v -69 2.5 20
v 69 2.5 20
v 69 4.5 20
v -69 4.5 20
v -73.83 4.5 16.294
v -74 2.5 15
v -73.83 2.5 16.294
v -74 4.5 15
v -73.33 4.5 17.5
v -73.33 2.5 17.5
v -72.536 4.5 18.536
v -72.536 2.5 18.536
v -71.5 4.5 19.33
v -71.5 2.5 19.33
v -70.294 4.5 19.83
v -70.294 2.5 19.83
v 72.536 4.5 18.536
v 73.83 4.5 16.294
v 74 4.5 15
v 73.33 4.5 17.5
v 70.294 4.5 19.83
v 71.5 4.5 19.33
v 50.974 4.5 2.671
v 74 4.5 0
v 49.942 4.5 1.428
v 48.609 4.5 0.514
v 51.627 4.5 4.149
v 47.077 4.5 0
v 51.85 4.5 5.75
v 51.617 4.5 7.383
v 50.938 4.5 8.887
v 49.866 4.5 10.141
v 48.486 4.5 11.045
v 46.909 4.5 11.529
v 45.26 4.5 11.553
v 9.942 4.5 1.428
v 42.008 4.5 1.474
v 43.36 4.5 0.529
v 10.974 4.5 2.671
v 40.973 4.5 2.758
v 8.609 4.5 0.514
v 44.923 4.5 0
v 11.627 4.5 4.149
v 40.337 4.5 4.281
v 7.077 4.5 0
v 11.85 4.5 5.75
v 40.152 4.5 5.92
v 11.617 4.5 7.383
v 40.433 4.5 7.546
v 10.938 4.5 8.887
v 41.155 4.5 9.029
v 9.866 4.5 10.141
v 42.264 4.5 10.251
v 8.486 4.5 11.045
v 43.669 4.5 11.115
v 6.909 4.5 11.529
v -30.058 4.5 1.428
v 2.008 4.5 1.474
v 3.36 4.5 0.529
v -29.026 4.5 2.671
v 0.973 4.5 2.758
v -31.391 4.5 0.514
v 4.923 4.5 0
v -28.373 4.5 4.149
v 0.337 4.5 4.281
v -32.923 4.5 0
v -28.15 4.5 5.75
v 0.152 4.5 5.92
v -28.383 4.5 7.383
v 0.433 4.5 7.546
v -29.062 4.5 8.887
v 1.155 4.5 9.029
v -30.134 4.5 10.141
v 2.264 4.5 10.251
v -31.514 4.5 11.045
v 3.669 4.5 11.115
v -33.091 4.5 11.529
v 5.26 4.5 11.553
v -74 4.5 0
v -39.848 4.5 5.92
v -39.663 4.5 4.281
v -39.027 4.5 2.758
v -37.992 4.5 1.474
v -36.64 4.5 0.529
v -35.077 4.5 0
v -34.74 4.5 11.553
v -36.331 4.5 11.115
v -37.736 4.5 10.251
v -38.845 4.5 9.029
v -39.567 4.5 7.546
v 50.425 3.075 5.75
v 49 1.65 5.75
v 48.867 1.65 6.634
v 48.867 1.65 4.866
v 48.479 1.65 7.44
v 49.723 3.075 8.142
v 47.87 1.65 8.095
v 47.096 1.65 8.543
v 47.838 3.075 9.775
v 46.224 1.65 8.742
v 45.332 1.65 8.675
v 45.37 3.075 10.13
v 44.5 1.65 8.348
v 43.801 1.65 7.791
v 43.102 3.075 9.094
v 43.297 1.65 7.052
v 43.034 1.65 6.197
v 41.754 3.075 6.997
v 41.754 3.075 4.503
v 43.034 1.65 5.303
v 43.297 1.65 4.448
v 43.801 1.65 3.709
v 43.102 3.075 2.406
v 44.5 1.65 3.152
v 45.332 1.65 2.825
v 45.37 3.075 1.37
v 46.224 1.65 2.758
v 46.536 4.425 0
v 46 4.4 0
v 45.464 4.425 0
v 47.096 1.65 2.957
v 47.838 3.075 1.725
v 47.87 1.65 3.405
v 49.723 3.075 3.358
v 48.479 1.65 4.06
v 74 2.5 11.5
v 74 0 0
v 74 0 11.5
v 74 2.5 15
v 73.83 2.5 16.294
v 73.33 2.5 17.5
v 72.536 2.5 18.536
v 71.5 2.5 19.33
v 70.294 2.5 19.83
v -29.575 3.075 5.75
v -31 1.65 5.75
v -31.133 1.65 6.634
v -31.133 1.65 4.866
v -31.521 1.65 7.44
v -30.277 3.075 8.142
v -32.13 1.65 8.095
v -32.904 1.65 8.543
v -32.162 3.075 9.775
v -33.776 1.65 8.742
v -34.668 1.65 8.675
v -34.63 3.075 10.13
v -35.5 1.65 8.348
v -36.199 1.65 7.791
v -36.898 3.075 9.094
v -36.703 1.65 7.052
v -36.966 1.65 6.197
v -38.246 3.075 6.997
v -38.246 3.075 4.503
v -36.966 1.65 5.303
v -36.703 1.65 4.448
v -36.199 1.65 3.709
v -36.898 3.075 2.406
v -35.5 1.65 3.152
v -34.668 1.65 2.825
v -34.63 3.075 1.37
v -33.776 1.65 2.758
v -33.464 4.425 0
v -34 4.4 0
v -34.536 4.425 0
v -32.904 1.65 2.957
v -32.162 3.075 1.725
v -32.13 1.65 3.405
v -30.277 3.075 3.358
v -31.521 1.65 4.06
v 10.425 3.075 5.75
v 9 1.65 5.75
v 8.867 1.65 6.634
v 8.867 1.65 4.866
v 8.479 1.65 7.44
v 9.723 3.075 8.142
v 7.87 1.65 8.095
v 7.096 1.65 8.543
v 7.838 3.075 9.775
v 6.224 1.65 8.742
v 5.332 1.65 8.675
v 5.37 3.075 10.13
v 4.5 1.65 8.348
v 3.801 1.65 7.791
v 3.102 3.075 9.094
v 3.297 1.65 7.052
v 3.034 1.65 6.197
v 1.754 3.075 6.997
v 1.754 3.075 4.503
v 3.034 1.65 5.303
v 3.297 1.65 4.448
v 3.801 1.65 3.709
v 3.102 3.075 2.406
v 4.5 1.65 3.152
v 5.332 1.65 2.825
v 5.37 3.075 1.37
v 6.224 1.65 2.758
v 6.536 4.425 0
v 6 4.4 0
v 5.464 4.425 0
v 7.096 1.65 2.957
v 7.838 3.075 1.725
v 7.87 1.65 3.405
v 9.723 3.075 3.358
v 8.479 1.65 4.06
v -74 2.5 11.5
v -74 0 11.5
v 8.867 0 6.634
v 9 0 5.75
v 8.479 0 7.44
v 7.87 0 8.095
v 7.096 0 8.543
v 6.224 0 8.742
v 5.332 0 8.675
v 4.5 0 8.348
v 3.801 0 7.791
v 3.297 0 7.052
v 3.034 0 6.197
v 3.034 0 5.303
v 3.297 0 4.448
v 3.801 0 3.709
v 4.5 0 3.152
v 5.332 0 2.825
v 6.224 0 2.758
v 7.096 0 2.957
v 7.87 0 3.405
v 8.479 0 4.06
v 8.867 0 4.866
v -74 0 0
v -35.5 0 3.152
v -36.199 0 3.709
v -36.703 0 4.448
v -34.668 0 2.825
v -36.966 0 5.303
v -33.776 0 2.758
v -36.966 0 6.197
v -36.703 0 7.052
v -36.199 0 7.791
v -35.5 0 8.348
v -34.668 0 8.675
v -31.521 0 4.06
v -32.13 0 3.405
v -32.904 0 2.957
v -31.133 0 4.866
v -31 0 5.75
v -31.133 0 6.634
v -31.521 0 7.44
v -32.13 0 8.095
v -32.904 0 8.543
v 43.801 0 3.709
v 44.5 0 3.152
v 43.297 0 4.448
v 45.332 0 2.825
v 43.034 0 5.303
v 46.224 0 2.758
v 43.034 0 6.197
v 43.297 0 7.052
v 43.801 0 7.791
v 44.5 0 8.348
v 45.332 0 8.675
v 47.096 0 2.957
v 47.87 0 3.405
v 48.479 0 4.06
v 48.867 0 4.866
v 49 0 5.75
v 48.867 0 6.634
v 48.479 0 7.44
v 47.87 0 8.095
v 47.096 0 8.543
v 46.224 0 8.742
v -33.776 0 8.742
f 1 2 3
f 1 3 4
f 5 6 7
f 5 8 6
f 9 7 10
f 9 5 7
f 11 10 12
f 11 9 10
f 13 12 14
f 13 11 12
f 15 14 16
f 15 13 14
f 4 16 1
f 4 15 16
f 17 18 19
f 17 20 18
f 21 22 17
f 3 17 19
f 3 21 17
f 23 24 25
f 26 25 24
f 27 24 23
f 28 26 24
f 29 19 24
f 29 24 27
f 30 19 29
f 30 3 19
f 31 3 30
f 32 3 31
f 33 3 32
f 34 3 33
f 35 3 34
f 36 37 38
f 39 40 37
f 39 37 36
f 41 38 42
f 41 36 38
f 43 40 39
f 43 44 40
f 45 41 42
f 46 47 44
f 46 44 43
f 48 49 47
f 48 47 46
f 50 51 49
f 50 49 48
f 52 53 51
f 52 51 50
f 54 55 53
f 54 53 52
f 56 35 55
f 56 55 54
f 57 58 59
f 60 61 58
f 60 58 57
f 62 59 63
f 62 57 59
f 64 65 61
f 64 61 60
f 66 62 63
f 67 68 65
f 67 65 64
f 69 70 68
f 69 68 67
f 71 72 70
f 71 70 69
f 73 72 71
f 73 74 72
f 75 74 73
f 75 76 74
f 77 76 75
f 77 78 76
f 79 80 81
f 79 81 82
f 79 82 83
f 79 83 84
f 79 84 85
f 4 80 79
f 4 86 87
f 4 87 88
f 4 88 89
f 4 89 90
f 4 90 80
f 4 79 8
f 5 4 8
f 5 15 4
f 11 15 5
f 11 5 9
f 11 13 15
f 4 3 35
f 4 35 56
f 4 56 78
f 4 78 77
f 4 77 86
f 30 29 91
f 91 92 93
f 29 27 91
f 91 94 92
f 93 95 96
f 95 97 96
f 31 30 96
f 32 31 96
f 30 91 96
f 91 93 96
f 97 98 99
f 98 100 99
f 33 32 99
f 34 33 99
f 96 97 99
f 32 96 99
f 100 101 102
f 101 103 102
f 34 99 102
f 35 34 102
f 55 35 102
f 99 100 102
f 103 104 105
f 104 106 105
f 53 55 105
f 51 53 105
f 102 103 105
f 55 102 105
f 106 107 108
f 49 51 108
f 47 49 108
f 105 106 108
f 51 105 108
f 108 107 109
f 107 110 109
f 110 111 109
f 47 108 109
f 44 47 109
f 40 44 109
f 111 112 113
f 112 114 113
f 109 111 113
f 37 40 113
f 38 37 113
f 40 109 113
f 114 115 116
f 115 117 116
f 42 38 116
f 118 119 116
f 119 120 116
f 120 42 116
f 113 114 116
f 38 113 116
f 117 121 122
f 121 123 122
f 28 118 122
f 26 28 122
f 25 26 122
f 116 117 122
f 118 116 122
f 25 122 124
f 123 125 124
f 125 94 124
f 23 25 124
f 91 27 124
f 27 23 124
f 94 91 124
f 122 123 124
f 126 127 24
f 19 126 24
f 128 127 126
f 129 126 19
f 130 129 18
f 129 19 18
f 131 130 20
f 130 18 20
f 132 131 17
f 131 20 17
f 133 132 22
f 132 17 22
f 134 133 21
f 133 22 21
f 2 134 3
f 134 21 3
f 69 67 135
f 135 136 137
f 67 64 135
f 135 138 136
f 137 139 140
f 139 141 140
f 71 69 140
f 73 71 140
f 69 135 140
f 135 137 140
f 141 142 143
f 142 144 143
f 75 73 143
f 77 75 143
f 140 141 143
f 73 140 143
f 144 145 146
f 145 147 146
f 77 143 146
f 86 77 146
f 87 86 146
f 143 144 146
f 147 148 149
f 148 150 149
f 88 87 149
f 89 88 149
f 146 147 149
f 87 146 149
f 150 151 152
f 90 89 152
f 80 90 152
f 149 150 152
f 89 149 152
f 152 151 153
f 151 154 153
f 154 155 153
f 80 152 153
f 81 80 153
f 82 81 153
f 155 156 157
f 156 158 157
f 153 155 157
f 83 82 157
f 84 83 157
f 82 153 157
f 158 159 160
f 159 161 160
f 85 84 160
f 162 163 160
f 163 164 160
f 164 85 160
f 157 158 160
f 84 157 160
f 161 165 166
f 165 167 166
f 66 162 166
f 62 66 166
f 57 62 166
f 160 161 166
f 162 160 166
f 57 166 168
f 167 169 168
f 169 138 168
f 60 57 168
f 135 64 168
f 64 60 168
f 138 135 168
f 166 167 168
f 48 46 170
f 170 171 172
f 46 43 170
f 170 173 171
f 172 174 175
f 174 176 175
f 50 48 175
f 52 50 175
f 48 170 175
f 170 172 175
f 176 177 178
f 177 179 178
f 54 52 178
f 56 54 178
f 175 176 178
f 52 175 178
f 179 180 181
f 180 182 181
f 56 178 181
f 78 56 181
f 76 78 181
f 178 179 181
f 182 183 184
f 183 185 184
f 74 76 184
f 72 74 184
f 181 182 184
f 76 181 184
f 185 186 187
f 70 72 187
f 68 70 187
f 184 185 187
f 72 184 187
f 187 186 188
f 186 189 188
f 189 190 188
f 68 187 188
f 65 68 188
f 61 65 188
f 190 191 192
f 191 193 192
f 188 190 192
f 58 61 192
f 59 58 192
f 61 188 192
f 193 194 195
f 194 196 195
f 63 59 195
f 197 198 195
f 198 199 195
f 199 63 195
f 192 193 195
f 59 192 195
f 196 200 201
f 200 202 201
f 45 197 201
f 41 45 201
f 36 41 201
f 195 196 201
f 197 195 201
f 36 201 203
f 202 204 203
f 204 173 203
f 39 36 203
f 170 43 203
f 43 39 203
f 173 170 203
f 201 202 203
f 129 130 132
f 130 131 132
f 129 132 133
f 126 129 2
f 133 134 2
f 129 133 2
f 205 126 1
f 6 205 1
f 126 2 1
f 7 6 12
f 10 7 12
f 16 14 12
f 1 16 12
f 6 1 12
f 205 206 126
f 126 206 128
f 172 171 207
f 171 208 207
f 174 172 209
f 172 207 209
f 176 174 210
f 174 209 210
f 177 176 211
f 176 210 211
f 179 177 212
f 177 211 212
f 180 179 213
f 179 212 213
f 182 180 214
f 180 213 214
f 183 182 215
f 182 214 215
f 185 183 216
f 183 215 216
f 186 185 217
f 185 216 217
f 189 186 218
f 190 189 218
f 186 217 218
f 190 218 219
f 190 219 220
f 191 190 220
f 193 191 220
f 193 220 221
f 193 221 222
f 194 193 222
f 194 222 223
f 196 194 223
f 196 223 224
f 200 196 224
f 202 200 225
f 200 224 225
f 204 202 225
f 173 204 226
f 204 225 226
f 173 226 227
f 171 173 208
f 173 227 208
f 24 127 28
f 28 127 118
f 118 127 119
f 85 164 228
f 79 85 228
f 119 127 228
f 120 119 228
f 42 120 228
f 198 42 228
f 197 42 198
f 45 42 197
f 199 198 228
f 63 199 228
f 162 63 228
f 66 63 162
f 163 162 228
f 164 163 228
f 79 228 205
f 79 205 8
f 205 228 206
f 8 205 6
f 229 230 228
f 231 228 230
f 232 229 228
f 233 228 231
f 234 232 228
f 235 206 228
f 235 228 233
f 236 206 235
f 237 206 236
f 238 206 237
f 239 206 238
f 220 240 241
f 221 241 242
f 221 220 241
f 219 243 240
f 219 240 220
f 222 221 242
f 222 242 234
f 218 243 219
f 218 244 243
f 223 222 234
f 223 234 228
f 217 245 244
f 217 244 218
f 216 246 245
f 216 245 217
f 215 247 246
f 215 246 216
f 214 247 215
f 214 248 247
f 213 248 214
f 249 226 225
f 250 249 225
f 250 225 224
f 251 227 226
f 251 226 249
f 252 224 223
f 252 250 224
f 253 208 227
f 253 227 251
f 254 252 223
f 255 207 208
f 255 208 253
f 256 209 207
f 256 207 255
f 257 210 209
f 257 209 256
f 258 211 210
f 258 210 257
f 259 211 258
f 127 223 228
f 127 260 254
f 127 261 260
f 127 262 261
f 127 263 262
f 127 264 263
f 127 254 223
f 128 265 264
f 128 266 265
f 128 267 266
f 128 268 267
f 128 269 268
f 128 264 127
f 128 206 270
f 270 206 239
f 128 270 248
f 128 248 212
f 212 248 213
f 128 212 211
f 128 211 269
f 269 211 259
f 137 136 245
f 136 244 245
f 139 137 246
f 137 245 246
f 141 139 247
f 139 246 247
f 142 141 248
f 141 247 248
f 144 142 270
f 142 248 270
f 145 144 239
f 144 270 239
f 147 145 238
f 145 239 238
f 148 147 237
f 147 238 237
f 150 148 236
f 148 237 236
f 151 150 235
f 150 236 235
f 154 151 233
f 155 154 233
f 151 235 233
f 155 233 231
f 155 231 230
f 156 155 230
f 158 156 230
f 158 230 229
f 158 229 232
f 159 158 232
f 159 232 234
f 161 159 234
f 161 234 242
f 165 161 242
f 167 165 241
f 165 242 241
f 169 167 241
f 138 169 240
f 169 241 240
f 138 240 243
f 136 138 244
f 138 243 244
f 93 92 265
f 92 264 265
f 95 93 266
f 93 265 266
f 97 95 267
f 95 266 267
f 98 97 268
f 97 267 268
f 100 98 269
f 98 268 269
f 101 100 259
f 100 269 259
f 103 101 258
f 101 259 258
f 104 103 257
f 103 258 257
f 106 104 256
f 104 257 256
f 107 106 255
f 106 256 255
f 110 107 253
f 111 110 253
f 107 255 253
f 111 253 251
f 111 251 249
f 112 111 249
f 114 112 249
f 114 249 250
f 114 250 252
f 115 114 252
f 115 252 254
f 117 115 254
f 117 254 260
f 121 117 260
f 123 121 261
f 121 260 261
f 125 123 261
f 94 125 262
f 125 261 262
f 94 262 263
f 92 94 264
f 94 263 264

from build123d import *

# Parameters (mm, degrees)
F0_W           = 148
F0_H           = 11.5
F1_DEPTH       = 2.5
F2_W           = 148
F2_H           = 20
F3_DEPTH       = 2
F5_D           = 6
F5_CSINK_D     = 11.7
F5_CSINK_ANGLE = 90
F6_R           = 5


with BuildPart() as f1:
    # F0 (on Front) → F1 (new body)
    with BuildSketch(Plane.XZ):
        with Locations((0, 5.75)):
            Rectangle(F0_W, F0_H)
    extrude(amount=-F1_DEPTH)

    # F2 (on face) → F3 (join)
    with BuildSketch(Plane(origin=(0, 2.5, 0), x_dir=(-1, 0, 0), z_dir=(0, 1, 0))):
        with Locations((0, 10)):
            Rectangle(F2_W, F2_H)
    extrude(amount=F3_DEPTH)

    # F5 (through all)
    with Locations(Plane(origin=(0, 4.5, 0), x_dir=(-1, 0, 0), z_dir=(0, 1, 0))):
        with Locations((-46, 5.75), (-6, 5.75), (34, 5.75)):
            CounterSinkHole(F5_D / 2, F5_CSINK_D / 2, counter_sink_angle=F5_CSINK_ANGLE)

    # F6
    f6_edges = [f1.edges().sort_by_distance(p)[0] for p in [
        (-74, 3.5, 20),
        (74, 3.5, 20),
    ]]
    fillet(f6_edges, radius=F6_R)


solid = f1.part
